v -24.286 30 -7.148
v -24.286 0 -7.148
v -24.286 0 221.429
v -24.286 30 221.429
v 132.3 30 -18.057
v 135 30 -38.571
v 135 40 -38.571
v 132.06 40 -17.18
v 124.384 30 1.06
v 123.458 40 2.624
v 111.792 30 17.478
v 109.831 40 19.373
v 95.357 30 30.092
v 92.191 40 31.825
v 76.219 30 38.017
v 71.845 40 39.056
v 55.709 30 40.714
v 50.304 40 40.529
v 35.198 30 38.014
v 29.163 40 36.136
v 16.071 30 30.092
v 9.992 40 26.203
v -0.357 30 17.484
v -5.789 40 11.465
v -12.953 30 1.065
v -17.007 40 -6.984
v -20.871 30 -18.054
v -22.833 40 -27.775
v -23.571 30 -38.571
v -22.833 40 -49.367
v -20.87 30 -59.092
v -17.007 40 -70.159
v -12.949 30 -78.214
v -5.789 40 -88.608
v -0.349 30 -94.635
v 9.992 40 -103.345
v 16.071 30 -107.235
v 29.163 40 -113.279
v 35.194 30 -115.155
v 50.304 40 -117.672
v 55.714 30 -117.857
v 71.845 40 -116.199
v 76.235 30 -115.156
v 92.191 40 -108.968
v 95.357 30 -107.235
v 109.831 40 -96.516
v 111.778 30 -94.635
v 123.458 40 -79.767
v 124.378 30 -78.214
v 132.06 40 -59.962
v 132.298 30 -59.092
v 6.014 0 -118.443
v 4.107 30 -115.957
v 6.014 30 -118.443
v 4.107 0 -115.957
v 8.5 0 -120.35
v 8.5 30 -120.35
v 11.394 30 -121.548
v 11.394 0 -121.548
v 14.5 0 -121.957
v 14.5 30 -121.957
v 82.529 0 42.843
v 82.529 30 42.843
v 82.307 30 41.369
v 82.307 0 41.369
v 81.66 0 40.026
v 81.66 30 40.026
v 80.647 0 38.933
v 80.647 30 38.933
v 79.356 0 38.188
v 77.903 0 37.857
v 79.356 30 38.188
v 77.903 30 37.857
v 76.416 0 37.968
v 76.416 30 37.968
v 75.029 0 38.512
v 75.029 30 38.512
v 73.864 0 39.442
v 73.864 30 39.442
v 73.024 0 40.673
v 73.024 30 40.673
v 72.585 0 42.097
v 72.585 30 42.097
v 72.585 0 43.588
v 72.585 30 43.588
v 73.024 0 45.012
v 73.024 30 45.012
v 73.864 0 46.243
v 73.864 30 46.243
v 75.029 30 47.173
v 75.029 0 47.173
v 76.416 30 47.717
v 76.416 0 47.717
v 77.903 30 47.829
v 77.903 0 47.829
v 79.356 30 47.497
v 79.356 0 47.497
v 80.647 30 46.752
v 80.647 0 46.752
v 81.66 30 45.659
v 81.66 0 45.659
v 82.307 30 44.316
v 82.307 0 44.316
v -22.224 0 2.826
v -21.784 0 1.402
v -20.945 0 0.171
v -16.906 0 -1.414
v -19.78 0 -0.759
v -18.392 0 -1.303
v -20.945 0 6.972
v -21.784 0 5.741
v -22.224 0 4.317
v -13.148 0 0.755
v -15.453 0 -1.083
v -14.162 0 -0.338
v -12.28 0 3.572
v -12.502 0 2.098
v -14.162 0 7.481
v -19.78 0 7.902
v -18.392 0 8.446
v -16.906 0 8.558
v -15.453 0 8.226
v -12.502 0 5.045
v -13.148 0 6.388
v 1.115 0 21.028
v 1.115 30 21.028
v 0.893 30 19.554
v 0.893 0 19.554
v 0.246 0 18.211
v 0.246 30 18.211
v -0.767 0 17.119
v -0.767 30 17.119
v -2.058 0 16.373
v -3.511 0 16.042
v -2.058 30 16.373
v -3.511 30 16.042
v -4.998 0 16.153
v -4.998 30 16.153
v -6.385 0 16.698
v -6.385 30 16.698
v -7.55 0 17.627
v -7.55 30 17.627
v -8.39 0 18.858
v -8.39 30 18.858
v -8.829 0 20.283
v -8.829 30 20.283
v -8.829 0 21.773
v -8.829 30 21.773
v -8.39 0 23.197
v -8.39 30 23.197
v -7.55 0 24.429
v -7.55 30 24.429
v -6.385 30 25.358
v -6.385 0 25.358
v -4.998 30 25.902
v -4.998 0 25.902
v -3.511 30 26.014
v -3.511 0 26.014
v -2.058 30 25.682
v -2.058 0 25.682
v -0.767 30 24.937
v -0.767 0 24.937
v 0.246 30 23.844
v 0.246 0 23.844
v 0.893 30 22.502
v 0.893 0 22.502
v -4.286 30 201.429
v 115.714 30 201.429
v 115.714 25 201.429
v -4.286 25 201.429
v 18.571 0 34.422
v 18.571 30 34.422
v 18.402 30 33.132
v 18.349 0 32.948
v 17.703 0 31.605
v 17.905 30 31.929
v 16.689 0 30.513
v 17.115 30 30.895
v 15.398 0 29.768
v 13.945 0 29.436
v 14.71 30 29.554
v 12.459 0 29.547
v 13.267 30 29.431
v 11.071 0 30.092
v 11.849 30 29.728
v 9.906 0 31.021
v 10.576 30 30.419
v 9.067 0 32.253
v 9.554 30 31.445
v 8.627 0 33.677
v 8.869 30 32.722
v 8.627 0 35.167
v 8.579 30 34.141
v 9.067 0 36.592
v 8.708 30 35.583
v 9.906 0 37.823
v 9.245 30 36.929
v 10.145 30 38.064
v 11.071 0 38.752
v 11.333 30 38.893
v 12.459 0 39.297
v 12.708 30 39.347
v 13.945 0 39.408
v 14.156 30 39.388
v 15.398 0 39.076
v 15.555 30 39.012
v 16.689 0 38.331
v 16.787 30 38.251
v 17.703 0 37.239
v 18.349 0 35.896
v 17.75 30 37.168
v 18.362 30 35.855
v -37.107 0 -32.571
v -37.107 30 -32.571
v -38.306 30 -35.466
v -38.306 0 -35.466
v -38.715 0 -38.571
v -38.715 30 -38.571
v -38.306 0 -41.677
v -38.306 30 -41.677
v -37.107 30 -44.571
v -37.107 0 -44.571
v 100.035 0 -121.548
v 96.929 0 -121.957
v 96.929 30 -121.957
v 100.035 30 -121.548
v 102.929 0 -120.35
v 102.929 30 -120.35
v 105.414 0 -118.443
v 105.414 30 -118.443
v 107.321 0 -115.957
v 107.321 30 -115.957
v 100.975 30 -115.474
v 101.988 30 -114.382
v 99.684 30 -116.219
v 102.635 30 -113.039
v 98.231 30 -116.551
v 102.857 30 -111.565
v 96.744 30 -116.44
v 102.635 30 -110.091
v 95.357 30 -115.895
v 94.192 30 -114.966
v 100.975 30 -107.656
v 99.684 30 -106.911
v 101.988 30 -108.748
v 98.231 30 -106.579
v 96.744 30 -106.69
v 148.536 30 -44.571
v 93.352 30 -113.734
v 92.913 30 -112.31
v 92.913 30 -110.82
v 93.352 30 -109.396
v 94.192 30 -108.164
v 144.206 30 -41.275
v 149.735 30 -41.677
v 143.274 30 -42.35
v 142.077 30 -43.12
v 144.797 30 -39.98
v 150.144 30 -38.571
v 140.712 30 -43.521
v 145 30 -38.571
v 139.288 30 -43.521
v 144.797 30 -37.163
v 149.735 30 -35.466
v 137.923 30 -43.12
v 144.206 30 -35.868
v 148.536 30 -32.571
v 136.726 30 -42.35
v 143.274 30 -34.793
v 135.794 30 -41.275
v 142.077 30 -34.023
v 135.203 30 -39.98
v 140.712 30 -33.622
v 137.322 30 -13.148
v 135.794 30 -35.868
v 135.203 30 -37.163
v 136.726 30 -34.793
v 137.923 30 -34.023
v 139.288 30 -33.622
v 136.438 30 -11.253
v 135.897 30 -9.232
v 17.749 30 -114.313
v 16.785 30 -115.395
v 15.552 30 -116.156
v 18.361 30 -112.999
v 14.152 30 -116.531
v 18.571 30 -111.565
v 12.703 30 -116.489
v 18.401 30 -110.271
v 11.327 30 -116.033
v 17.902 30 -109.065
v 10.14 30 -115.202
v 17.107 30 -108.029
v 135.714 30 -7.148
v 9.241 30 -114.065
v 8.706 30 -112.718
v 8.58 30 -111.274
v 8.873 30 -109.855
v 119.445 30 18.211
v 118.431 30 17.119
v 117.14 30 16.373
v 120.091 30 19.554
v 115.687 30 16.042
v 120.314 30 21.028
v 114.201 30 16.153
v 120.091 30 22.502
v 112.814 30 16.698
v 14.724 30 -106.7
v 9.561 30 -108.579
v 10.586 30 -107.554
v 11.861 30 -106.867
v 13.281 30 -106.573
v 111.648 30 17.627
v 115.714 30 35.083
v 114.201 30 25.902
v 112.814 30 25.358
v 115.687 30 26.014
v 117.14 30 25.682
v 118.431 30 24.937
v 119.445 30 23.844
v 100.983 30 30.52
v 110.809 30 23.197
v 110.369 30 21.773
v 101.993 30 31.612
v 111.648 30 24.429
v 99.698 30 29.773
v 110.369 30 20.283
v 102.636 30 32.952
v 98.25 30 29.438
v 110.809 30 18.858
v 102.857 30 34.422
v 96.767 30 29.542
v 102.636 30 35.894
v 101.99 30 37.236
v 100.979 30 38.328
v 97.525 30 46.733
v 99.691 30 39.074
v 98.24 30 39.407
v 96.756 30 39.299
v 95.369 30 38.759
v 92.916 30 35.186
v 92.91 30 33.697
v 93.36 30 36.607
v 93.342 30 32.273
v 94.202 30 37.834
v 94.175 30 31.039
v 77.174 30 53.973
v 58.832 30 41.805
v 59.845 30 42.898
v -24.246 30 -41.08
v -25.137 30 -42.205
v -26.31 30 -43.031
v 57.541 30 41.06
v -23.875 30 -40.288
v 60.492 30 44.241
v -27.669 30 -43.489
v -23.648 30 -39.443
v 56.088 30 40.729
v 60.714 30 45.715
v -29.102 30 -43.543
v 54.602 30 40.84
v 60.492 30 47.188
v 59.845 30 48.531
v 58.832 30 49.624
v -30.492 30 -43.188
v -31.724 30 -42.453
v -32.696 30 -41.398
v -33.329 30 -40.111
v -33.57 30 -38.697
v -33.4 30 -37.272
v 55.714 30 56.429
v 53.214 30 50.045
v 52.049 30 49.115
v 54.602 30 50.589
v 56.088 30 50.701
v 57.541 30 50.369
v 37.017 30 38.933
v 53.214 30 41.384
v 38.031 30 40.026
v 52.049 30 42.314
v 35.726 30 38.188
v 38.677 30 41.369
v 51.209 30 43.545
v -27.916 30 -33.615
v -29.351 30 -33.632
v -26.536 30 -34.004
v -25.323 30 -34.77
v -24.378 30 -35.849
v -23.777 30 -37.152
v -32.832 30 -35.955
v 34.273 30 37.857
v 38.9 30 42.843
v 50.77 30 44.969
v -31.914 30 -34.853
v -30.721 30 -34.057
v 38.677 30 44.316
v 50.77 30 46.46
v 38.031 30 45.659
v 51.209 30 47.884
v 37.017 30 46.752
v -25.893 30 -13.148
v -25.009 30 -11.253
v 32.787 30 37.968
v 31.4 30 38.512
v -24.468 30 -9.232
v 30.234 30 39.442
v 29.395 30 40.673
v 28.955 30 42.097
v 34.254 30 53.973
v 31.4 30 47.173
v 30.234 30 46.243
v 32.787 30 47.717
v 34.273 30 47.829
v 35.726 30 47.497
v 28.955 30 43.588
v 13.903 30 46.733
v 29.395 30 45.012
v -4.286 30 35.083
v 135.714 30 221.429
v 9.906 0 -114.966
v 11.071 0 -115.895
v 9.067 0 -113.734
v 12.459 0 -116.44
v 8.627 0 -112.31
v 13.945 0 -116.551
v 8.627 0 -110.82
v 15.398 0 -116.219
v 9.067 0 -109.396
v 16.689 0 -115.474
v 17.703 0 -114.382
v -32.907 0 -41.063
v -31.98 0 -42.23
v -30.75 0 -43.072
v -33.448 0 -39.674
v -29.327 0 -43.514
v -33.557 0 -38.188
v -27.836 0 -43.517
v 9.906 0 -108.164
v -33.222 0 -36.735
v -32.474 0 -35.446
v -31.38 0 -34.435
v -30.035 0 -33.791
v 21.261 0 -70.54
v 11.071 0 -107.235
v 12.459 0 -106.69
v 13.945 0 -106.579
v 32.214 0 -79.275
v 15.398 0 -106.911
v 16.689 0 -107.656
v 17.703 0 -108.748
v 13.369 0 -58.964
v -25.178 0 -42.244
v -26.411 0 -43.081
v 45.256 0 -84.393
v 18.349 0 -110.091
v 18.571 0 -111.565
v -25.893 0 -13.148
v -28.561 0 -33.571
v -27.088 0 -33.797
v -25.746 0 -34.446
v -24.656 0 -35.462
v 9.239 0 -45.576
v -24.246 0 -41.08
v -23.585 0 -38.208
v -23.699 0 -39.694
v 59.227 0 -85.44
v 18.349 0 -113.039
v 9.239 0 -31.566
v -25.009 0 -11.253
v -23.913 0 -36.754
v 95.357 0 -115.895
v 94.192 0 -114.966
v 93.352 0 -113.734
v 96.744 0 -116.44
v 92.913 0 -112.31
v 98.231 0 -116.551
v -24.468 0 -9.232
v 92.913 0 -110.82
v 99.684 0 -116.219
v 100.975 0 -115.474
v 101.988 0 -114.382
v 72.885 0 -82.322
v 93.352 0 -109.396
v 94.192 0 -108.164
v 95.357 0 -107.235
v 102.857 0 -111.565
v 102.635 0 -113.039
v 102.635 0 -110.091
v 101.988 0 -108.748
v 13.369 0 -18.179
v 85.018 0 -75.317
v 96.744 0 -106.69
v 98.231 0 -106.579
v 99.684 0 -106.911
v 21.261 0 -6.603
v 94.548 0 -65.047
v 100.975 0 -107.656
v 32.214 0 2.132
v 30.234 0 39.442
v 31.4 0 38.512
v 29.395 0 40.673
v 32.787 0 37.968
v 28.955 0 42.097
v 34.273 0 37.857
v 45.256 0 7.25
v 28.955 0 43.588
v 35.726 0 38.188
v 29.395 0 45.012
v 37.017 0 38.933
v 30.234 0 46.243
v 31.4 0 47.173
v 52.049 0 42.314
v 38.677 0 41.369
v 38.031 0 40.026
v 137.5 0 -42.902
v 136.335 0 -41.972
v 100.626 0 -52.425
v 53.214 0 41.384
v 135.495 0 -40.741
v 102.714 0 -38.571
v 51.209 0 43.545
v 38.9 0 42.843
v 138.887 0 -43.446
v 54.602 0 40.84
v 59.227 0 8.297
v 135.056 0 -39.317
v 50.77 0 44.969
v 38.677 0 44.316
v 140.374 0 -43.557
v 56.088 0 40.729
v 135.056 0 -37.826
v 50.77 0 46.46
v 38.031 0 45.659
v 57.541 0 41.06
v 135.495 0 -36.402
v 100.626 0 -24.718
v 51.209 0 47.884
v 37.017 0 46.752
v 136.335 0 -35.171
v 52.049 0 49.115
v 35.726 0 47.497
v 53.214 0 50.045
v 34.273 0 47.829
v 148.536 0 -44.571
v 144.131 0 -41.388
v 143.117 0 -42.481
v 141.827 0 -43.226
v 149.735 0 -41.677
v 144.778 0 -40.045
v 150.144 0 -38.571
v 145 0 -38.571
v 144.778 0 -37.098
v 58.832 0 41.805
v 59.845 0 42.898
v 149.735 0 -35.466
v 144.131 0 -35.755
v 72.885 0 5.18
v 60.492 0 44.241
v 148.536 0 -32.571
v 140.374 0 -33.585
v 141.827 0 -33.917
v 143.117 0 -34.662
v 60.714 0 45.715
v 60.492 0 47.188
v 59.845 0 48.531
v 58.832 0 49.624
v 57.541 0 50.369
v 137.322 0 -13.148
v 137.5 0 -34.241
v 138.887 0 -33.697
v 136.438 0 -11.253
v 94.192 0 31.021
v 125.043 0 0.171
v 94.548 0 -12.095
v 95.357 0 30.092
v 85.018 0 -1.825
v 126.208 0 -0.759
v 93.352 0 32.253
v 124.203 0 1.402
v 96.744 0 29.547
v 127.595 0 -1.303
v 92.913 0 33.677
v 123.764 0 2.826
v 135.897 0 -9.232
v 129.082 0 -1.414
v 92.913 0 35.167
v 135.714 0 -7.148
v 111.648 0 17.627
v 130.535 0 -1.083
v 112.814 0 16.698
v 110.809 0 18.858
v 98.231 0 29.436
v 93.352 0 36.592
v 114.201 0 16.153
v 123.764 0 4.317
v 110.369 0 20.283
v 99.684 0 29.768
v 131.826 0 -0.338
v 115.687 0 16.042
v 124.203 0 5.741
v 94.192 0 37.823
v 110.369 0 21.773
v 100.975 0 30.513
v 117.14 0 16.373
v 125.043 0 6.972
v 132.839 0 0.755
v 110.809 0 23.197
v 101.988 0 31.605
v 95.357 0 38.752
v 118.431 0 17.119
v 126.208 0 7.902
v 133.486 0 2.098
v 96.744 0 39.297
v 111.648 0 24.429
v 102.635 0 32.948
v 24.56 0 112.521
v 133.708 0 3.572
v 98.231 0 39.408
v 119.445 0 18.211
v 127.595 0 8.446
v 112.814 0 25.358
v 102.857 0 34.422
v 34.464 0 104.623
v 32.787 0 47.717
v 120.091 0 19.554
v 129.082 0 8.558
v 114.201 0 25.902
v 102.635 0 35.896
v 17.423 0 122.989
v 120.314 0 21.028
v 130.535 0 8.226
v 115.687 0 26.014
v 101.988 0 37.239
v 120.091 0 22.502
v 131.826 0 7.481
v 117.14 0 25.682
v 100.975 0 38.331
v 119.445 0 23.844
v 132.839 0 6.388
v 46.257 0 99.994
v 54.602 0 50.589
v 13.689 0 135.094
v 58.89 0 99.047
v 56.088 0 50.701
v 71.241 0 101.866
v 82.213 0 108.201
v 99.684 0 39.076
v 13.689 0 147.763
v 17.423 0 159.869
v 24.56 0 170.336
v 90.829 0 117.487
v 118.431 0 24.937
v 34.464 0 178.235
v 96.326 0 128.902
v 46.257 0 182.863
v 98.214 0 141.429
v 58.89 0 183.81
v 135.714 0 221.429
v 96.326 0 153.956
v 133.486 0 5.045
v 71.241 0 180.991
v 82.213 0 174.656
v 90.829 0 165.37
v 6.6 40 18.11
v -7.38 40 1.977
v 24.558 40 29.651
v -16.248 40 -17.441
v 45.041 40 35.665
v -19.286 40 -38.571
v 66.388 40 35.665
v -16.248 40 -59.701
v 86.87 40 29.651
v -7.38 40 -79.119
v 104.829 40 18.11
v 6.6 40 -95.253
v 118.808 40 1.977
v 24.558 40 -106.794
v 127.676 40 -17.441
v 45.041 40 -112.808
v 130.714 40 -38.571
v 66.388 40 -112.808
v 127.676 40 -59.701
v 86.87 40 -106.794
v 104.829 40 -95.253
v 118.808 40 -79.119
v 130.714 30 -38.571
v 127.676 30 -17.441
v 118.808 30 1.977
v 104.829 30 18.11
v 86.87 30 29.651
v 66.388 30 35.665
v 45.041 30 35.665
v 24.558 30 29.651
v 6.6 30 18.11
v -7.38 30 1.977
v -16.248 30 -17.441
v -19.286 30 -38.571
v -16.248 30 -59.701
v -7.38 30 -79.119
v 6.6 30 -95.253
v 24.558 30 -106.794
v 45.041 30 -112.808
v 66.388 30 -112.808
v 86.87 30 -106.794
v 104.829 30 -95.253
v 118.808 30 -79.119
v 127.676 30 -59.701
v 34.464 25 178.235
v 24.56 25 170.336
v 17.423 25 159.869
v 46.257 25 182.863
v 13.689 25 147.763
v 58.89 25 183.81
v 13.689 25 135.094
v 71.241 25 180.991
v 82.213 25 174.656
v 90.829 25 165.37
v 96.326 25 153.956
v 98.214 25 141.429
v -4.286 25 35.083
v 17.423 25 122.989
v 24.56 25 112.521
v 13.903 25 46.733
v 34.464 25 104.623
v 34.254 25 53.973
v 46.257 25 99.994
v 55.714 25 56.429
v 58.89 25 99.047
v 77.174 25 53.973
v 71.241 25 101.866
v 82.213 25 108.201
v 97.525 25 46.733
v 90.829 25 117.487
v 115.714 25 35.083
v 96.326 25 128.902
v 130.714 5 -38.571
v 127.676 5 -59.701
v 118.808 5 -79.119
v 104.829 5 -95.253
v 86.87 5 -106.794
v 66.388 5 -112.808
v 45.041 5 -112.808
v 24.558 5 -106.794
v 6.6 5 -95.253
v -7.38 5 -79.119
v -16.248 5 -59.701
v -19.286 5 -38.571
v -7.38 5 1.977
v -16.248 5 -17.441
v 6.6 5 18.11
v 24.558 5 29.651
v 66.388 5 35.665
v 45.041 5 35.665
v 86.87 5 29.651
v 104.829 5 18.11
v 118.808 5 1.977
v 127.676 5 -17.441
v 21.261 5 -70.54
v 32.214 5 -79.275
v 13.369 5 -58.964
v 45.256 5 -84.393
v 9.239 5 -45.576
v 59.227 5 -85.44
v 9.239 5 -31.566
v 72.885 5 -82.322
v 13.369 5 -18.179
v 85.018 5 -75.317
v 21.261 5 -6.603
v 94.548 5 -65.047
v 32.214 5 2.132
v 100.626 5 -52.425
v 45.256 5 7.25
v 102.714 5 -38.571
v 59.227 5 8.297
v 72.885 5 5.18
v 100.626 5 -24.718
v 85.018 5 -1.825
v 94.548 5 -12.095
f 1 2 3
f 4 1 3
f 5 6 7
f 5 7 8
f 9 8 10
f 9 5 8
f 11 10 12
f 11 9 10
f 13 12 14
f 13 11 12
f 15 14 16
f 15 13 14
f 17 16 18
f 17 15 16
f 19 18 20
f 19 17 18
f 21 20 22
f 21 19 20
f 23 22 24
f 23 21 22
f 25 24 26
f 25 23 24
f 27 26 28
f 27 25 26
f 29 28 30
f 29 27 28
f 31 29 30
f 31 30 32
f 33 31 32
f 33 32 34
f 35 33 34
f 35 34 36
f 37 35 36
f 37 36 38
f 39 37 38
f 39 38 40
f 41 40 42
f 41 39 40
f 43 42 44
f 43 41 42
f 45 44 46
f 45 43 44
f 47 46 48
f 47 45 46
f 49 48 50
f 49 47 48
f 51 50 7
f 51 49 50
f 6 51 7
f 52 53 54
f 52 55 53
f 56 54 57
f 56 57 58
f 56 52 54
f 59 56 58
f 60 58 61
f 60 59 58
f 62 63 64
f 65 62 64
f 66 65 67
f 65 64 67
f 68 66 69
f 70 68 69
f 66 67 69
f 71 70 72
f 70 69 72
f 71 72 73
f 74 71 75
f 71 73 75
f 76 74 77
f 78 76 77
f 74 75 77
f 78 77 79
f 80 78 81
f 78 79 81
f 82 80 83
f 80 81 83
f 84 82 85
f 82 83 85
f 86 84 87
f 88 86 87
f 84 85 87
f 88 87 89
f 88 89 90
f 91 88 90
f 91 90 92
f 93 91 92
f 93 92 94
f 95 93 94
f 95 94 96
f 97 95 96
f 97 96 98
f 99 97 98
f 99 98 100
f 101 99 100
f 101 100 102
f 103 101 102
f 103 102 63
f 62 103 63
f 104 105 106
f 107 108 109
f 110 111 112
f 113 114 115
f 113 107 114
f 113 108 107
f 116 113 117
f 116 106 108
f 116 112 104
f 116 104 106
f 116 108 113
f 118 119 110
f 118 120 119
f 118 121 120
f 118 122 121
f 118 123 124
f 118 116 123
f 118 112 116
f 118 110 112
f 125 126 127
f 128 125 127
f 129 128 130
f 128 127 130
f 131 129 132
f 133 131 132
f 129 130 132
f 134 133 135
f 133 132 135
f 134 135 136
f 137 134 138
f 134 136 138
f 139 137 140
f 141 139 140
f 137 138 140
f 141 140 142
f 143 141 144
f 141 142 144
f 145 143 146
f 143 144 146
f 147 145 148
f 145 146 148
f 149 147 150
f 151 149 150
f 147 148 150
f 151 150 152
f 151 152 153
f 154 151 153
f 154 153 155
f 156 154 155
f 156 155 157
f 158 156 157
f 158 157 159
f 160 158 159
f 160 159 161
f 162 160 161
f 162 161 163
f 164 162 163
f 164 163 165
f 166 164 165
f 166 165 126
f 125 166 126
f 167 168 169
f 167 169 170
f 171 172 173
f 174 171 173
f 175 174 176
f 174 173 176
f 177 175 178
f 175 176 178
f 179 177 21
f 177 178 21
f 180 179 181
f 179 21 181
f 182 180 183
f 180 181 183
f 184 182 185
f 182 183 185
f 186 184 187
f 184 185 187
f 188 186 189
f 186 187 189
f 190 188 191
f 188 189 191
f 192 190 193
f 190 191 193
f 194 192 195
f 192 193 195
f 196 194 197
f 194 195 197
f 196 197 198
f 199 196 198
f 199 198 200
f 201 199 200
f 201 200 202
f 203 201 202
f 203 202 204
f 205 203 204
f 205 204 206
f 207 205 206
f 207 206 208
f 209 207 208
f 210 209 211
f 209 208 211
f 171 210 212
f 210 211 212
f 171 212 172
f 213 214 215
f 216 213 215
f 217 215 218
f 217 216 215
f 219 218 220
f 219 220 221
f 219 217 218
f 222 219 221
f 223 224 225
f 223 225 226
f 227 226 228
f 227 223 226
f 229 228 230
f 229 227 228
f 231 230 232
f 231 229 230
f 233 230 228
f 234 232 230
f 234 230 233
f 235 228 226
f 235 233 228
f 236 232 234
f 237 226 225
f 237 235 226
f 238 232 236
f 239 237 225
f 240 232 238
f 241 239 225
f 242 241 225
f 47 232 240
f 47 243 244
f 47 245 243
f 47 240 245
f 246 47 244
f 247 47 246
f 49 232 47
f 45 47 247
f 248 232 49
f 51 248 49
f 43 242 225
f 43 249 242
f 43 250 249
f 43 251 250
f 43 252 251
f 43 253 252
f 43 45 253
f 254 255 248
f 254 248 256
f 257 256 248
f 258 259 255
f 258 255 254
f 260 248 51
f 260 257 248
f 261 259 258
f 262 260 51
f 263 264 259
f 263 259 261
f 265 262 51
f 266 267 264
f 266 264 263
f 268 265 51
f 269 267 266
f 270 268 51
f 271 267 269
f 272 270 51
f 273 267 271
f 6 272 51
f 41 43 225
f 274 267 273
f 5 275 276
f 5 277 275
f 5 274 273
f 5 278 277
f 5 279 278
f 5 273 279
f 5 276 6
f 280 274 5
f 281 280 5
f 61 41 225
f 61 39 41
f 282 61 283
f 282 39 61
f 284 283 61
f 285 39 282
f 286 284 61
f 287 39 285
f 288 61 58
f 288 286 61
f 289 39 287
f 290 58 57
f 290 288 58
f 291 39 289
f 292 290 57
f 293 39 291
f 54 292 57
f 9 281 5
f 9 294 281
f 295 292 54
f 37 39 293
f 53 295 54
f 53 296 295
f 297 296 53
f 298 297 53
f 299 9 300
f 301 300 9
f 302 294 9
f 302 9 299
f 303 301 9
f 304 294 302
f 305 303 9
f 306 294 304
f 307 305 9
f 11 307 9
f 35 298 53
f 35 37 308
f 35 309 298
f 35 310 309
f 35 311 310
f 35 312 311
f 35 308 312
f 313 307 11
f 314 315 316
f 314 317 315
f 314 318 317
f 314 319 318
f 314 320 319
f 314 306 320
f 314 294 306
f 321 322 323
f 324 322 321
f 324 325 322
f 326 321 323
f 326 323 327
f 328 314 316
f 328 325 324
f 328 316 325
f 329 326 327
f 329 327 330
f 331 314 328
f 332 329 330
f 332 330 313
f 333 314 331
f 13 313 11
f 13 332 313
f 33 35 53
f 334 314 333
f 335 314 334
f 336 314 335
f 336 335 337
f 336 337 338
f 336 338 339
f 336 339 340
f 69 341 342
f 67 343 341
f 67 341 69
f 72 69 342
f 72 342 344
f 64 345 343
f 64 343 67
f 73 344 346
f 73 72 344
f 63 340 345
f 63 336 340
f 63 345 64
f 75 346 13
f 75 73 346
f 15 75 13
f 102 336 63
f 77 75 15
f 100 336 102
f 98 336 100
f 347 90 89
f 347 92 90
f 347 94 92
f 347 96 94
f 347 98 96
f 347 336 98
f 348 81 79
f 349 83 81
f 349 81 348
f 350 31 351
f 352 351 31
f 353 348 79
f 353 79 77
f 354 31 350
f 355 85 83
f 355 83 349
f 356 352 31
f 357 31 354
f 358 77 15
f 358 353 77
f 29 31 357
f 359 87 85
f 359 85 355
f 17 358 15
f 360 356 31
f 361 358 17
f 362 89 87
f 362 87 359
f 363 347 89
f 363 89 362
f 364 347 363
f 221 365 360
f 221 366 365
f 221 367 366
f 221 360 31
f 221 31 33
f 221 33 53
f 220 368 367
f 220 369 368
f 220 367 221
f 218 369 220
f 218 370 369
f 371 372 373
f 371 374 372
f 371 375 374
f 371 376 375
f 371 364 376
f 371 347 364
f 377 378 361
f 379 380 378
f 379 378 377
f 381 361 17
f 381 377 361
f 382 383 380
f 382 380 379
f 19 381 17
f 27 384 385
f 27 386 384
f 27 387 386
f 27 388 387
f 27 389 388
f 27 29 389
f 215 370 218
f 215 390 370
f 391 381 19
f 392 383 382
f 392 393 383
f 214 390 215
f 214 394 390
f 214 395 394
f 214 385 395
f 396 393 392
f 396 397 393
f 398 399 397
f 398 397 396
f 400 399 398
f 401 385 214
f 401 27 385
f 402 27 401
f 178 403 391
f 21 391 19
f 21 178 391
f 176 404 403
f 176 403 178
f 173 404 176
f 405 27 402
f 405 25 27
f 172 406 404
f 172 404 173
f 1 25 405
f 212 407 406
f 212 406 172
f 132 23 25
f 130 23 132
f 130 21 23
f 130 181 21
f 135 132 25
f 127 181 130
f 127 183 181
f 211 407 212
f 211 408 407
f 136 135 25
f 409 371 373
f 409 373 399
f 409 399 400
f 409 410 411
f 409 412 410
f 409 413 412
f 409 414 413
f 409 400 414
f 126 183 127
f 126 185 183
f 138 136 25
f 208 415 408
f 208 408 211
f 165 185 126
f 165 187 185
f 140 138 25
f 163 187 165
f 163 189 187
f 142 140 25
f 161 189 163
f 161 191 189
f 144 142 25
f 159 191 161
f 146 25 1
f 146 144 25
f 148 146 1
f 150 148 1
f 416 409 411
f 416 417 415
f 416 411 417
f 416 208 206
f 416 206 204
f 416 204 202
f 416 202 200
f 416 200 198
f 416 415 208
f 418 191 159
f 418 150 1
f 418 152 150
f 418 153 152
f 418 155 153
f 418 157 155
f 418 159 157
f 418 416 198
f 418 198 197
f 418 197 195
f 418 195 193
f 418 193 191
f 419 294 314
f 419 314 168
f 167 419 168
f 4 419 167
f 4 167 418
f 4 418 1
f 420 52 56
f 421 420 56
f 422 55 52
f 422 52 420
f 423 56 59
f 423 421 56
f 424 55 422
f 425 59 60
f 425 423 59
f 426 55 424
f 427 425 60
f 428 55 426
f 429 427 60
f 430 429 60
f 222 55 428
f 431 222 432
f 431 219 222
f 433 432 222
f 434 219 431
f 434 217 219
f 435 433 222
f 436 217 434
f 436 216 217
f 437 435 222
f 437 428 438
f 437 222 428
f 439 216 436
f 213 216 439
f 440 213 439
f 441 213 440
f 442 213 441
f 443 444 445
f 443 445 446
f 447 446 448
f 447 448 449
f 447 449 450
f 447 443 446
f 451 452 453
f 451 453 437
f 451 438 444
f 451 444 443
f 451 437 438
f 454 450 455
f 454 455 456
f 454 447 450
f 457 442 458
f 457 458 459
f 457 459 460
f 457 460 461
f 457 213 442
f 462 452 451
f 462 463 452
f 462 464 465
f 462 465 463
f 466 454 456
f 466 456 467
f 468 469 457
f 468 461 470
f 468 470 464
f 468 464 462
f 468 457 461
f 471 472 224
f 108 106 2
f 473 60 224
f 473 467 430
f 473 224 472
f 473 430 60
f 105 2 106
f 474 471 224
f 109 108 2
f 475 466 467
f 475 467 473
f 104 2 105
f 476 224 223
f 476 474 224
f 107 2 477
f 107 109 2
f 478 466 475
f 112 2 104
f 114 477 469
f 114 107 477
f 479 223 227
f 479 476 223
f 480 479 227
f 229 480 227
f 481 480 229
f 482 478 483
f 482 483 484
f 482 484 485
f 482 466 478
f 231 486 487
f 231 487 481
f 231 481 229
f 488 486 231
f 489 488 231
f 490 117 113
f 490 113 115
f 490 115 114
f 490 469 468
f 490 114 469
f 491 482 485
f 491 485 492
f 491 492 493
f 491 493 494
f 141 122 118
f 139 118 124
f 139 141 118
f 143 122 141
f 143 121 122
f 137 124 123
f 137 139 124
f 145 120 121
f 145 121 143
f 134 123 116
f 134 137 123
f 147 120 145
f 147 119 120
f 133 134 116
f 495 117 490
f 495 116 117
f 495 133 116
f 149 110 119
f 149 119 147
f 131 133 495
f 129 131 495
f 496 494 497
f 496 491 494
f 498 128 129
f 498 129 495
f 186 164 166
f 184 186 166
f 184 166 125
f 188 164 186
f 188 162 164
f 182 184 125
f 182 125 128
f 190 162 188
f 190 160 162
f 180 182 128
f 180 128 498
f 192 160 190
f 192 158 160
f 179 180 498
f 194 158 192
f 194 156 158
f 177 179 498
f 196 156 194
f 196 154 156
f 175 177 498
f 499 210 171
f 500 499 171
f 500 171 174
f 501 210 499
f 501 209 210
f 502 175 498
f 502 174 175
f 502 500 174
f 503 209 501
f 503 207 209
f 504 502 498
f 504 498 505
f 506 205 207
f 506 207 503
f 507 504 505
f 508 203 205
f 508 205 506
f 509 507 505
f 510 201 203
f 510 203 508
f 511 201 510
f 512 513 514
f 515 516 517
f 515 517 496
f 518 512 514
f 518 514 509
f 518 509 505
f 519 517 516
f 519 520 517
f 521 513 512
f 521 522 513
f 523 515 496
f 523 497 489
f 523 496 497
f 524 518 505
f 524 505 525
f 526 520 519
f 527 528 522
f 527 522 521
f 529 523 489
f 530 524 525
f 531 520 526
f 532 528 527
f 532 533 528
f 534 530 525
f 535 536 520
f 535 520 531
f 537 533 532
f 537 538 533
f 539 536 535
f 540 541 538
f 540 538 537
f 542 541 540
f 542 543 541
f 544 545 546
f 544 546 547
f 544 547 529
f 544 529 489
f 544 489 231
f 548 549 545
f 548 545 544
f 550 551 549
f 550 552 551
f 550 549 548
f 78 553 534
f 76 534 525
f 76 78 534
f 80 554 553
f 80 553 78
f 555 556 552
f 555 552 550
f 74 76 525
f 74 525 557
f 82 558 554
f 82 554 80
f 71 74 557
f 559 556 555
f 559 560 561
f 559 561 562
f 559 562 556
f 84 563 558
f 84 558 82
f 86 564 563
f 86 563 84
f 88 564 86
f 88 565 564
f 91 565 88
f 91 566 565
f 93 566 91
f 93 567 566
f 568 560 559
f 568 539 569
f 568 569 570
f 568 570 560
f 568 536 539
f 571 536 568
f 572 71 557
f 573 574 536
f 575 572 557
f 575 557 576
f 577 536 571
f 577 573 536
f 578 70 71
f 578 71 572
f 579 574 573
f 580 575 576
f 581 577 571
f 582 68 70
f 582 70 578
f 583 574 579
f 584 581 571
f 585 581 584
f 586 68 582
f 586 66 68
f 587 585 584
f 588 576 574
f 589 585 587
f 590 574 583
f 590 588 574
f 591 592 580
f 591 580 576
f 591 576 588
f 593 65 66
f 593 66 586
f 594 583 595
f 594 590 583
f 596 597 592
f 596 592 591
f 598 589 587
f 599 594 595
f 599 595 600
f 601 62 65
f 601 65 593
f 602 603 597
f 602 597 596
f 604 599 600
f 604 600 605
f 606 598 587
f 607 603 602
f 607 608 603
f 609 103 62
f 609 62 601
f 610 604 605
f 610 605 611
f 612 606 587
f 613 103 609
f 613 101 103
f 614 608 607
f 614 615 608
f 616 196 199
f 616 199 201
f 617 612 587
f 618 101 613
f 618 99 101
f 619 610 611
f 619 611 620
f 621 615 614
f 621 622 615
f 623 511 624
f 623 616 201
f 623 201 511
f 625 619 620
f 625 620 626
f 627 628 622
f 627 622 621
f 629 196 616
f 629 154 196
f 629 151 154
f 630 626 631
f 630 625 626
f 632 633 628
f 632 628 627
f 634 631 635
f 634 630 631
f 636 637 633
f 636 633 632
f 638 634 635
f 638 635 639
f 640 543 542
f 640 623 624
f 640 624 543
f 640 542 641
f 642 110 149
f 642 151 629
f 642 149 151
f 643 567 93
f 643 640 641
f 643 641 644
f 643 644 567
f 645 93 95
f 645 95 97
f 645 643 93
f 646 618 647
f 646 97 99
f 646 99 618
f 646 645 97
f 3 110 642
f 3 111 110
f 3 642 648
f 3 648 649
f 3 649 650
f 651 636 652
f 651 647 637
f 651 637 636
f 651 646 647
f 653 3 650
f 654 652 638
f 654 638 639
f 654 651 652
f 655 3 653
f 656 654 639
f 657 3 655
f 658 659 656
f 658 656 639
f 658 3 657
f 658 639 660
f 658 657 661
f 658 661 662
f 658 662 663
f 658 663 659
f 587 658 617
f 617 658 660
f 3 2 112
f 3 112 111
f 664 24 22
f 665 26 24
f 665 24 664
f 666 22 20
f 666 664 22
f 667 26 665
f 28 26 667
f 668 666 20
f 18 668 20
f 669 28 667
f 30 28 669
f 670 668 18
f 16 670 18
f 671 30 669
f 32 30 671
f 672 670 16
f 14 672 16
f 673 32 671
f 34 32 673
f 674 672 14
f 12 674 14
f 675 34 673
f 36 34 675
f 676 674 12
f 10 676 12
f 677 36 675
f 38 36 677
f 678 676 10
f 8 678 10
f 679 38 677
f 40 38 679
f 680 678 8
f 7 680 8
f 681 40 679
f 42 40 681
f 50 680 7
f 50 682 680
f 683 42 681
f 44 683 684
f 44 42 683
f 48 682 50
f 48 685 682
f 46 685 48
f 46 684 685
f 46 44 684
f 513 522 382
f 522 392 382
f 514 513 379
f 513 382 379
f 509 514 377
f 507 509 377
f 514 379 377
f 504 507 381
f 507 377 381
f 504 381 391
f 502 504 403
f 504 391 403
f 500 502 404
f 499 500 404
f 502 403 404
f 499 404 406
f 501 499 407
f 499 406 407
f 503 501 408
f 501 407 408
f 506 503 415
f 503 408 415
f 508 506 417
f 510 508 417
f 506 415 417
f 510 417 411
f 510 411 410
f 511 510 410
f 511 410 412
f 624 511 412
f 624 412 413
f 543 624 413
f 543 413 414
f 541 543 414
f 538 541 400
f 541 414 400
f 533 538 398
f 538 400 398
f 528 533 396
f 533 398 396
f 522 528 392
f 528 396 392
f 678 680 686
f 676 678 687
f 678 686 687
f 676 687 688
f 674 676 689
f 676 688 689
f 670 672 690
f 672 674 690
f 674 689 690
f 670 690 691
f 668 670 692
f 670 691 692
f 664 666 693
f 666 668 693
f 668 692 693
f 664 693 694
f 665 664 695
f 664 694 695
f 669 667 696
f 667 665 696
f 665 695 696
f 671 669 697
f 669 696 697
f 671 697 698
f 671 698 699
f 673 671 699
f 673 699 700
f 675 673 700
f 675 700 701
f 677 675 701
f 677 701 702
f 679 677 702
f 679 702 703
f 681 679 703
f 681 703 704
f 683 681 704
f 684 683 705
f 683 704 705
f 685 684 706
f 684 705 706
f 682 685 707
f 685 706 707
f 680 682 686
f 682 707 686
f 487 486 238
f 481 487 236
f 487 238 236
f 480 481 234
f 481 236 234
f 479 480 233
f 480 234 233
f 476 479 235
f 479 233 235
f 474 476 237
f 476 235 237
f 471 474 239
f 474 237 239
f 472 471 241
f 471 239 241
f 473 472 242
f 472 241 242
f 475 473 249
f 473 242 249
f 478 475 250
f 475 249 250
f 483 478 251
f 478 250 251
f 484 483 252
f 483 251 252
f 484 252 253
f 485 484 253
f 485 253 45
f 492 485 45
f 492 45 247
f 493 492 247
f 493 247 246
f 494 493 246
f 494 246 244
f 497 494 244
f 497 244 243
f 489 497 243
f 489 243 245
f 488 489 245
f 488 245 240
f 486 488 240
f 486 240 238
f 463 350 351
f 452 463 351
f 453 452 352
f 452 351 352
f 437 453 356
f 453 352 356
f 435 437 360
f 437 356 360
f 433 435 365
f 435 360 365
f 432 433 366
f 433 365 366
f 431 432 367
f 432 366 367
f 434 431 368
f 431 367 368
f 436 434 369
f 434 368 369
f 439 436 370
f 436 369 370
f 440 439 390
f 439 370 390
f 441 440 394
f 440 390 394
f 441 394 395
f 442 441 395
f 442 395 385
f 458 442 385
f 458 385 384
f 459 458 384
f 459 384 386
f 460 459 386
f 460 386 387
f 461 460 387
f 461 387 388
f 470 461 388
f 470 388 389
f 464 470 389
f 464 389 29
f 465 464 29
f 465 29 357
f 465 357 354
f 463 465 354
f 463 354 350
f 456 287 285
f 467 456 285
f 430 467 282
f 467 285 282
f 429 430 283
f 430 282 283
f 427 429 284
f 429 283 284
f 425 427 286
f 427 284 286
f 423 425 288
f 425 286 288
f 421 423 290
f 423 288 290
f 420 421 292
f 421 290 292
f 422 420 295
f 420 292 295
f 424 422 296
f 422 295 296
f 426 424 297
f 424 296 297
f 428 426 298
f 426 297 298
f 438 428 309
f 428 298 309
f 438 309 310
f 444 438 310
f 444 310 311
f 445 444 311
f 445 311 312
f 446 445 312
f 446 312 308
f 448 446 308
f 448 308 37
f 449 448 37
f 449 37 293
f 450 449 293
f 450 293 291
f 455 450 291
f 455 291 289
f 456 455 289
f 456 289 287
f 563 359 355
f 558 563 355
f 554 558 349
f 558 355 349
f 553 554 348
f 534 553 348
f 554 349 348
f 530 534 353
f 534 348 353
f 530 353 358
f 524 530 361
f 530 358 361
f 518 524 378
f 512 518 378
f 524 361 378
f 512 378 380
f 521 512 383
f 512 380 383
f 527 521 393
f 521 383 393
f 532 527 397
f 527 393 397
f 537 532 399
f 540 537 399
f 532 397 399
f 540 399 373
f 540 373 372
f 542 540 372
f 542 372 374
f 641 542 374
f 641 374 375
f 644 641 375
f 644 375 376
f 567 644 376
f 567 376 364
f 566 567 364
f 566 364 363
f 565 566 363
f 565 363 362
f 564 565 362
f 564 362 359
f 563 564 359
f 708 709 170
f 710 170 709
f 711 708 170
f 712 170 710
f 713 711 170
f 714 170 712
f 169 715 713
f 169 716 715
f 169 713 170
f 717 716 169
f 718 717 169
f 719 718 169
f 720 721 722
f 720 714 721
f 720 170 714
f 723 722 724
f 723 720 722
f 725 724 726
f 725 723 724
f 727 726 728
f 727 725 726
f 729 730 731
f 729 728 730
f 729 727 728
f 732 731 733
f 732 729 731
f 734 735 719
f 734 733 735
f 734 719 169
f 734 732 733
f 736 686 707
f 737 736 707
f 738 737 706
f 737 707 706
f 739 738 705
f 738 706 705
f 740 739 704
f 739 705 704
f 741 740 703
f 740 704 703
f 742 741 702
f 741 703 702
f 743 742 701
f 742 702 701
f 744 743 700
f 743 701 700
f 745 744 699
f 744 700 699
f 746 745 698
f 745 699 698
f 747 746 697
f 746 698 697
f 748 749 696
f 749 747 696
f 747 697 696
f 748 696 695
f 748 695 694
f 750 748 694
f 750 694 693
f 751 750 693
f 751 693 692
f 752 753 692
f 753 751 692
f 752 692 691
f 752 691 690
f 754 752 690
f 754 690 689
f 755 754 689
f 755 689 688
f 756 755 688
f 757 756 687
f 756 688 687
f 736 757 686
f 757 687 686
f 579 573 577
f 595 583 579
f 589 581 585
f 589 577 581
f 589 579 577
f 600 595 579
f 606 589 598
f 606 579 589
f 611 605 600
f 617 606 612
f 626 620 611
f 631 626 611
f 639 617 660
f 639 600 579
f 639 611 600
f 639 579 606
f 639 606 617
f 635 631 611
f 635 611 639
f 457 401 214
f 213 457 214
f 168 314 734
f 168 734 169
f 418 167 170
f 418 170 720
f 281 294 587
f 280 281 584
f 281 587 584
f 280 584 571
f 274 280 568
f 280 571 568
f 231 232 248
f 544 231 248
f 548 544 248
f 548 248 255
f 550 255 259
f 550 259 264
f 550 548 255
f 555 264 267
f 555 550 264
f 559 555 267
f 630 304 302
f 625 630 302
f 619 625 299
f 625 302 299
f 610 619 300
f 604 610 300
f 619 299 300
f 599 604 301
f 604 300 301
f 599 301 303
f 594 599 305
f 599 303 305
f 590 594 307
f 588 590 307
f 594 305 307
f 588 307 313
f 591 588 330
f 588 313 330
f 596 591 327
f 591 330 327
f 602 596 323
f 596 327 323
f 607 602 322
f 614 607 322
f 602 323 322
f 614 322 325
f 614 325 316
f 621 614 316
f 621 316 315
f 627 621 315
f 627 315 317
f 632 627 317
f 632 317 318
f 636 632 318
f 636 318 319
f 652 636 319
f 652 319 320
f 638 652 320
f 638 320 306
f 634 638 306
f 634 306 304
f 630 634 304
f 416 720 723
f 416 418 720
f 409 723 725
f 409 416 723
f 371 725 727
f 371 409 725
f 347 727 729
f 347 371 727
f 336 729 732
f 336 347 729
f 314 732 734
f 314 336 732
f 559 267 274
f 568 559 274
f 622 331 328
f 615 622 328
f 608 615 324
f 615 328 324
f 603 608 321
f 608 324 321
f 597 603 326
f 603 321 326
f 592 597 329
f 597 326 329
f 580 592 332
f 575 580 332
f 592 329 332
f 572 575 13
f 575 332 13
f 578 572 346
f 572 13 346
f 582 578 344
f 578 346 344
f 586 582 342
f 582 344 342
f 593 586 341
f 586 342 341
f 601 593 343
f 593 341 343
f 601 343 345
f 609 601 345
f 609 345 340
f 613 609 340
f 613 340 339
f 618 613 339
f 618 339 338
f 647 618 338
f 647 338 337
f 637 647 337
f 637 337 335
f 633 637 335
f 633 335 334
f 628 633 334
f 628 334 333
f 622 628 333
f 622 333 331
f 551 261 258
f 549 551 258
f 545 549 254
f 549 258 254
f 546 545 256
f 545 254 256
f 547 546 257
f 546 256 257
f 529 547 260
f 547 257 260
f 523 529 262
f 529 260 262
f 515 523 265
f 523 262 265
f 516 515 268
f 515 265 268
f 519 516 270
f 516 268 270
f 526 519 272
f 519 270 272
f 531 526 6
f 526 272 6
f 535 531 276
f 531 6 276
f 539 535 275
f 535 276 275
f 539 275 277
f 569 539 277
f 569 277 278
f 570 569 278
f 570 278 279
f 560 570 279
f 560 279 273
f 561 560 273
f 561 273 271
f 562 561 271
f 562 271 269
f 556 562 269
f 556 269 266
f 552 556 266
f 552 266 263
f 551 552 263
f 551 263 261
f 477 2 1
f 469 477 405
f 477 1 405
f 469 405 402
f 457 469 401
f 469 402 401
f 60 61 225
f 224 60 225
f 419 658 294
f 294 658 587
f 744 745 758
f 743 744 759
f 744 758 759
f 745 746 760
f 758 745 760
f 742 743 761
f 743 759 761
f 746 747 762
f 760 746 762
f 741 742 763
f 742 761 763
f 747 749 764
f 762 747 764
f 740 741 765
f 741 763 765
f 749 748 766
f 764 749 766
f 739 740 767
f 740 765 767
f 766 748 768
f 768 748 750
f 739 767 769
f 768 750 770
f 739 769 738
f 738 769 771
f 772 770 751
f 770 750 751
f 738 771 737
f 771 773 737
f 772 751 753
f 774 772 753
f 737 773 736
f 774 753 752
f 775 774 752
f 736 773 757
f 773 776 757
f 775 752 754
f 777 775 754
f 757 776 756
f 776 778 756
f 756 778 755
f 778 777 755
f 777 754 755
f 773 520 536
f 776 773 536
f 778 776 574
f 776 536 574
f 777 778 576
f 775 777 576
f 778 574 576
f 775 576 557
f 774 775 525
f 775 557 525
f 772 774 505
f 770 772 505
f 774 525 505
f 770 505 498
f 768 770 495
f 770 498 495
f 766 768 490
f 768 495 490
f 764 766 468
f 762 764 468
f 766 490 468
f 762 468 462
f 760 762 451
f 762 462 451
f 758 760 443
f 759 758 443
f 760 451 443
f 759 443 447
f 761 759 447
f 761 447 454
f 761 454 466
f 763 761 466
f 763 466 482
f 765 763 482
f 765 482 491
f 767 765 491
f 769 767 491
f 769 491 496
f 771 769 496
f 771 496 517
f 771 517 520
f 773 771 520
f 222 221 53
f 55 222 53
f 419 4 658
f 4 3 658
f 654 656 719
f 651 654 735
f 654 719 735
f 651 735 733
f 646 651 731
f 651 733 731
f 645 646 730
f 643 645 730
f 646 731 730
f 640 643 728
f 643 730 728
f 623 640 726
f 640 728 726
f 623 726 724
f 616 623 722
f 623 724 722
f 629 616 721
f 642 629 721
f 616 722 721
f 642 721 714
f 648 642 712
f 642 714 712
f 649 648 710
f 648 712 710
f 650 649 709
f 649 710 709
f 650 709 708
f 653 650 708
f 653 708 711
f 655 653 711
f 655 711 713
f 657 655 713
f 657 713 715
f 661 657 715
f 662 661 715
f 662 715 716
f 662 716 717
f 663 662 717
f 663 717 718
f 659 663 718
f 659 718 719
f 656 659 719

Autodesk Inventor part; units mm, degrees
ref_plane "YZ Plane" through (0, 0, 0) normal (1, 0, 0) x (0, 1, 0)
ref_plane "XZ Plane" through (0, 0, 0) normal (0, 1, 0) x (-1, 0, 0)
ref_plane "XY Plane" through (0, 0, 0) normal (0, 0, 1) x (1, 0, 0)
sketch "Sketch1" plane through (0, 0, 0) normal (0, 1, 0) x (-1, 0, 0)
  line L0 (24.2857, 221.4286) -> (-135.7143, 221.4286)
  line L1 (-135.7143, 221.4286) -> (-135.7143, -28.5714)
  line L2 (-135.7143, -28.5714) -> (24.2857, -28.5714)
  line L3 (24.2857, -28.5714) -> (24.2857, 221.4286)
  circle A0 centre (-55.7143, -38.5714) radius 80
  line L4 (24.2857, -28.5714) -> (24.2857, -38.5714)
  line L5 (-135.7143, -28.5714) -> (-135.7143, -38.5714)
  point P0 (0, 0)
  dimension "d0" = 250
  dimension "d1" = 160
  dimension "d2" = 160
  dimension "d8" = 10
extrude "Extrusion1" add sketch "Sketch1" along normal blind 30
sketch "Sketch2" plane through (0, 30, 0) normal (0, 1, 0) x (1, 0, 0)
  arc A0 (135.7143, 38.5714) -> (-24.2857, 38.5714) centre (55.7143, 38.5714) ccw projected
  circle A1 centre (55.7143, 38.5714) radius 75
  point P0 (0, 0)
  dimension "d5" = 150
extrude "Extrusion2" cut sketch "Sketch2" against normal blind 40
sketch "Sketch3" plane through (0, 30, 0) normal (0, 1, 0) x (1, 0, 0)
  circle A0 centre (55.7143, 38.5714) radius 75 projected
  circle A1 centre (55.7143, 38.5714) radius 75
  line L0 (152, 38.5714) -> (103.8571, -44.8144)
  line L1 (103.8571, -44.8144) -> (7.5714, -44.8144)
  line L2 (7.5714, -44.8144) -> (-40.5714, 38.5714)
  line L3 (-40.5714, 38.5714) -> (7.5714, 121.9573)
  line L4 (7.5714, 121.9573) -> (103.8571, 121.9573)
  line L5 (103.8571, 121.9573) -> (152, 38.5714)
  line L6 (140, 38.5714) -> (97.8571, -34.4221)
  line L7 (97.8571, -34.4221) -> (13.5714, -34.4221)
  line L8 (13.5714, -34.4221) -> (-28.5714, 38.5714)
  line L9 (-28.5714, 38.5714) -> (13.5714, 111.565)
  line L10 (13.5714, 111.565) -> (97.8571, 111.565)
  line L11 (97.8571, 111.565) -> (140, 38.5714)
  circle A2 centre (140, 38.5714) radius 5
  circle A3 centre (97.8571, 111.565) radius 5
  circle A4 centre (13.5714, 111.565) radius 5
  circle A5 centre (-28.5714, 38.5714) radius 5
  circle A6 centre (13.5714, -34.4221) radius 5
  circle A7 centre (97.8571, -34.4221) radius 5
  point P0 (0, 0)
  dimension "d15" = 360
sketch "Sketch4" plane through (0, 0, 0) normal (0, -1, 0) x (1, 0, 0)
  circle A0 centre (55.7143, -38.5714) radius 75 projected
  circle A1 centre (55.7143, -38.5714) radius 75
  circle A2 centre (55.7143, -38.5714) radius 47
  dimension "d9" = 94
  dimension "d10" = 150
extrude "Extrusion3" add sketch "Sketch4" against normal blind 5
sketch "Sketch5" plane through (0, 30, 0) normal (0, 1, 0) x (1, 0, 0)
  circle A0 centre (55.7143, 38.5714) radius 75
  circle A1 centre (55.7143, 38.5714) radius 75
  line L0 (152, 38.5714) -> (103.8571, -44.8144)
  line L1 (103.8571, -44.8144) -> (7.5714, -44.8144)
  line L2 (7.5714, -44.8144) -> (-40.5714, 38.5714)
  line L3 (-40.5714, 38.5714) -> (7.5714, 121.9573)
  line L4 (7.5714, 121.9573) -> (103.8571, 121.9573)
  line L5 (103.8571, 121.9573) -> (152, 38.5714)
  line L6 (140, 38.5714) -> (97.8571, -34.4221)
  line L7 (97.8571, -34.4221) -> (13.5714, -34.4221)
  line L8 (13.5714, -34.4221) -> (-28.5714, 38.5714)
  line L9 (-28.5714, 38.5714) -> (13.5714, 111.565)
  line L10 (13.5714, 111.565) -> (97.8571, 111.565)
  line L11 (97.8571, 111.565) -> (140, 38.5714)
  circle A2 centre (140, 38.5714) radius 5
  circle A3 centre (97.8571, 111.565) radius 5
  circle A4 centre (13.5714, 111.565) radius 5
  circle A5 centre (-28.5714, 38.5714) radius 5
  circle A6 centre (13.5714, -34.4221) radius 5
  circle A7 centre (97.8571, -34.4221) radius 5
  arc A8 (135.7143, 38.5714) -> (-24.2857, 38.5714) centre (55.7143, 38.5714) ccw projected
  circle A9 centre (55.7143, 38.5714) radius 2.2469
  point P0 (0, 0)
  point P1 (0, 0)
  dimension "d19" = 360
extrude "Extrusion4" cut sketch "Sketch5" against normal blind 30 contours A2 L11 L6 | L6 L11 A2 | A7 L7 L6 | L6 L7 A7 | A3 A8 L10 L11 | L11 L10 A3 | A3 A8 | A6 L8 L7 | L7 L8 A6 | A4 A8 L9 L10 | L10 L9 A4 | A4 A8 | A5 L9 L8 | L8 L9 A5
extrude "Extrusion5" add sketch "Sketch3" against normal blind 30 contours A0 L11 A2 L6 | A0 L10 A3 L11 | L6 A7 L7 A0 | A0 L9 A4 L10 | L7 A6 L8 A0 | A0 L8 A5 L9 | L0 L1 L2 L3 L4 L5
fillet "Fillet1" radius 12 6 edges at (103.8571, 15, -121.9573) (152, 15, -38.5714) (7.5714, 15, -121.9573) (-40.5714, 15, -38.5714) (-24.2857, 15, -10.3637) (135.7143, 15, -10.3637)
sketch "Sketch6" plane through (0, 30, 0) normal (0, 1, 0) x (1, 0, 0)
  circle A0 centre (13.5714, 111.565) radius 5 projected
  circle A1 centre (97.8571, 111.565) radius 5 projected
  circle A2 centre (-28.5714, 38.5714) radius 5 projected
  circle A3 centre (140, 38.5714) radius 5 projected
  circle A4 centre (55.7143, 38.5714) radius 75 projected
  circle A5 centre (97.8571, -34.4221) radius 5 projected
  circle A6 centre (13.5714, -34.4221) radius 5 projected
  arc A7 (-37.1073, 44.5714) -> (-37.1073, 32.5714) centre (-26.715, 38.5714) ccw projected
  line L0 (-37.1073, 32.5714) -> (-25.8934, 13.1484) projected
  arc A8 (-24.2857, 7.1484) -> (-25.8934, 13.1484) centre (-36.2857, 7.1484) ccw projected
  line L1 (-24.2857, 7.1484) -> (-24.2857, -221.4286) projected
  line L2 (-24.2857, -221.4286) -> (135.7143, -221.4286) projected
  line L3 (135.7143, -221.4286) -> (135.7143, 7.1484) projected
  arc A9 (137.322, 13.1484) -> (135.7143, 7.1484) centre (147.7143, 7.1484) ccw projected
  line L4 (137.322, 13.1484) -> (148.5359, 32.5714) projected
  arc A10 (148.5359, 32.5714) -> (148.5359, 44.5714) centre (138.1436, 38.5714) ccw projected
  line L5 (148.5359, 44.5714) -> (107.3212, 115.9573) projected
  arc A11 (107.3212, 115.9573) -> (96.9289, 121.9573) centre (96.9289, 109.9573) ccw projected
  line L6 (96.9289, 121.9573) -> (14.4996, 121.9573) projected
  arc A12 (14.4996, 121.9573) -> (4.1073, 115.9573) centre (14.4996, 109.9573) ccw projected
  line L7 (4.1073, 115.9573) -> (-37.1073, 44.5714) projected
  line L8 (-4.2857, -201.4286) -> (-4.2857, 7.1484)
  arc A13 (-4.2857, 7.1484) -> (-8.5729, 23.1484) centre (-36.2857, 7.1484) ccw
  line L9 (-8.5729, 23.1484) -> (-17.4774, 38.5714)
  line L10 (-17.4774, 38.5714) -> (19.1184, 101.9573)
  line L11 (19.1184, 101.9573) -> (92.3101, 101.9573)
  line L12 (92.3101, 101.9573) -> (128.906, 38.5714)
  line L13 (128.906, 38.5714) -> (120.0015, 23.1484)
  arc A14 (120.0015, 23.1484) -> (115.7143, 7.1484) centre (147.7143, 7.1484) ccw
  line L14 (115.7143, 7.1484) -> (115.7143, -201.4286)
  line L15 (115.7143, -201.4286) -> (-4.2857, -201.4286)
  circle A15 centre (55.7143, 38.5714) radius 95
  point P0 (0, 0)
  point P1 (115.7143, -35.0832)
  point P2 (-4.2857, -35.0832)
  dimension "d25" = 20
  dimension "d26" = 190
extrude "Extrusion6" cut sketch "Sketch6" against normal blind 5 contours A15 L14 L15 L8
sketch "Sketch7" plane through (0, 30, 0) normal (0, 1, 0) x (1, 0, 0)
  circle A0 centre (55.7143, 38.5714) radius 75 projected
  circle A1 centre (55.7143, 38.5714) radius 79.2857
  circle A2 centre (-28.5714, 38.5714) radius 5 projected
  circle A3 centre (55.7143, 38.5714) radius 75
  point P0 (0, 0)
  dimension "d29" = 150
extrude "Extrusion7" add sketch "Sketch7" along normal blind 10 contours A1
sketch "Sketch8" plane through (0, 30, 0) normal (0, 1, 0) x (1, 0, 0)
  circle A0 centre (55.7143, -45.7146) radius 5
  circle A1 centre (55.7143, 38.5714) radius 47 projected
  circle A2 centre (77.5291, -42.8426) radius 5
  circle A3 centre (97.8573, -34.4224) radius 5
  circle A4 centre (115.3135, -21.0278) radius 5
  circle A5 centre (128.7081, -3.5716) radius 5
  circle A6 centre (137.1283, 16.7566) radius 5
  circle A7 centre (140.0003, 38.5714) radius 5
  circle A8 centre (137.1283, 60.3863) radius 5
  circle A9 centre (128.7081, 80.7144) radius 5
  circle A10 centre (115.3135, 98.1706) radius 5
  circle A11 centre (97.8573, 111.5652) radius 5
  circle A12 centre (77.5291, 119.9855) radius 5
  circle A13 centre (55.7143, 122.8574) radius 5
  circle A14 centre (33.8995, 119.9855) radius 5
  circle A15 centre (13.5713, 111.5652) radius 5
  circle A16 centre (-3.8849, 98.1706) radius 5
  circle A17 centre (-17.2795, 80.7144) radius 5
  circle A18 centre (-25.6997, 60.3863) radius 5
  circle A19 centre (-28.5717, 38.5714) radius 5
  circle A20 centre (-25.6997, 16.7566) radius 5
  circle A21 centre (-17.2795, -3.5716) radius 5
  circle A22 centre (-3.8849, -21.0278) radius 5
  circle A23 centre (13.5713, -34.4224) radius 5
  circle A24 centre (33.8995, -42.8426) radius 5
  point P0 (0, 0)
  dimension "d32" = 84.286
  dimension "d35" = 360
  dimension "d39" = 10
extrude "Extrusion8" cut sketch "Sketch8" against normal blind 35 contours A0 | A2 | A4 | A5 | A21 | A22 | A24
sketch "Sketch9" plane through (0, 25, 0) normal (0, 1, 0) x (1, 0, 0)
  line L0 (135.7143, -221.4286) -> (135.7143, 7.1484) projected
  line L1 (-24.2857, -221.4286) -> (135.7143, -221.4286) projected
  line L2 (-24.2857, 7.1484) -> (-24.2857, -221.4286) projected
  circle A0 centre (55.7143, -141.4286) radius 80
  circle A1 centre (55.7143, -141.4286) radius 42.5
  point P0 (0, 0)
  dimension "d40" = 85
extrude "Extrusion9" cut sketch "Sketch9" against normal blind 40 contours A1
sketch "Sketch10" plane through (0, 0, 0) normal (0, -1, 0) x (1, 0, 0)
  circle A0 centre (-17.2795, 3.5716) radius 5 projected
  circle A1 centre (128.7081, 3.5716) radius 5 projected
  point P0 (0, 0)
extrude "Extrusion10" add sketch "Sketch10" against normal blind 30
properties part number "PatronDerzavka" material "Aluminum 6061"
